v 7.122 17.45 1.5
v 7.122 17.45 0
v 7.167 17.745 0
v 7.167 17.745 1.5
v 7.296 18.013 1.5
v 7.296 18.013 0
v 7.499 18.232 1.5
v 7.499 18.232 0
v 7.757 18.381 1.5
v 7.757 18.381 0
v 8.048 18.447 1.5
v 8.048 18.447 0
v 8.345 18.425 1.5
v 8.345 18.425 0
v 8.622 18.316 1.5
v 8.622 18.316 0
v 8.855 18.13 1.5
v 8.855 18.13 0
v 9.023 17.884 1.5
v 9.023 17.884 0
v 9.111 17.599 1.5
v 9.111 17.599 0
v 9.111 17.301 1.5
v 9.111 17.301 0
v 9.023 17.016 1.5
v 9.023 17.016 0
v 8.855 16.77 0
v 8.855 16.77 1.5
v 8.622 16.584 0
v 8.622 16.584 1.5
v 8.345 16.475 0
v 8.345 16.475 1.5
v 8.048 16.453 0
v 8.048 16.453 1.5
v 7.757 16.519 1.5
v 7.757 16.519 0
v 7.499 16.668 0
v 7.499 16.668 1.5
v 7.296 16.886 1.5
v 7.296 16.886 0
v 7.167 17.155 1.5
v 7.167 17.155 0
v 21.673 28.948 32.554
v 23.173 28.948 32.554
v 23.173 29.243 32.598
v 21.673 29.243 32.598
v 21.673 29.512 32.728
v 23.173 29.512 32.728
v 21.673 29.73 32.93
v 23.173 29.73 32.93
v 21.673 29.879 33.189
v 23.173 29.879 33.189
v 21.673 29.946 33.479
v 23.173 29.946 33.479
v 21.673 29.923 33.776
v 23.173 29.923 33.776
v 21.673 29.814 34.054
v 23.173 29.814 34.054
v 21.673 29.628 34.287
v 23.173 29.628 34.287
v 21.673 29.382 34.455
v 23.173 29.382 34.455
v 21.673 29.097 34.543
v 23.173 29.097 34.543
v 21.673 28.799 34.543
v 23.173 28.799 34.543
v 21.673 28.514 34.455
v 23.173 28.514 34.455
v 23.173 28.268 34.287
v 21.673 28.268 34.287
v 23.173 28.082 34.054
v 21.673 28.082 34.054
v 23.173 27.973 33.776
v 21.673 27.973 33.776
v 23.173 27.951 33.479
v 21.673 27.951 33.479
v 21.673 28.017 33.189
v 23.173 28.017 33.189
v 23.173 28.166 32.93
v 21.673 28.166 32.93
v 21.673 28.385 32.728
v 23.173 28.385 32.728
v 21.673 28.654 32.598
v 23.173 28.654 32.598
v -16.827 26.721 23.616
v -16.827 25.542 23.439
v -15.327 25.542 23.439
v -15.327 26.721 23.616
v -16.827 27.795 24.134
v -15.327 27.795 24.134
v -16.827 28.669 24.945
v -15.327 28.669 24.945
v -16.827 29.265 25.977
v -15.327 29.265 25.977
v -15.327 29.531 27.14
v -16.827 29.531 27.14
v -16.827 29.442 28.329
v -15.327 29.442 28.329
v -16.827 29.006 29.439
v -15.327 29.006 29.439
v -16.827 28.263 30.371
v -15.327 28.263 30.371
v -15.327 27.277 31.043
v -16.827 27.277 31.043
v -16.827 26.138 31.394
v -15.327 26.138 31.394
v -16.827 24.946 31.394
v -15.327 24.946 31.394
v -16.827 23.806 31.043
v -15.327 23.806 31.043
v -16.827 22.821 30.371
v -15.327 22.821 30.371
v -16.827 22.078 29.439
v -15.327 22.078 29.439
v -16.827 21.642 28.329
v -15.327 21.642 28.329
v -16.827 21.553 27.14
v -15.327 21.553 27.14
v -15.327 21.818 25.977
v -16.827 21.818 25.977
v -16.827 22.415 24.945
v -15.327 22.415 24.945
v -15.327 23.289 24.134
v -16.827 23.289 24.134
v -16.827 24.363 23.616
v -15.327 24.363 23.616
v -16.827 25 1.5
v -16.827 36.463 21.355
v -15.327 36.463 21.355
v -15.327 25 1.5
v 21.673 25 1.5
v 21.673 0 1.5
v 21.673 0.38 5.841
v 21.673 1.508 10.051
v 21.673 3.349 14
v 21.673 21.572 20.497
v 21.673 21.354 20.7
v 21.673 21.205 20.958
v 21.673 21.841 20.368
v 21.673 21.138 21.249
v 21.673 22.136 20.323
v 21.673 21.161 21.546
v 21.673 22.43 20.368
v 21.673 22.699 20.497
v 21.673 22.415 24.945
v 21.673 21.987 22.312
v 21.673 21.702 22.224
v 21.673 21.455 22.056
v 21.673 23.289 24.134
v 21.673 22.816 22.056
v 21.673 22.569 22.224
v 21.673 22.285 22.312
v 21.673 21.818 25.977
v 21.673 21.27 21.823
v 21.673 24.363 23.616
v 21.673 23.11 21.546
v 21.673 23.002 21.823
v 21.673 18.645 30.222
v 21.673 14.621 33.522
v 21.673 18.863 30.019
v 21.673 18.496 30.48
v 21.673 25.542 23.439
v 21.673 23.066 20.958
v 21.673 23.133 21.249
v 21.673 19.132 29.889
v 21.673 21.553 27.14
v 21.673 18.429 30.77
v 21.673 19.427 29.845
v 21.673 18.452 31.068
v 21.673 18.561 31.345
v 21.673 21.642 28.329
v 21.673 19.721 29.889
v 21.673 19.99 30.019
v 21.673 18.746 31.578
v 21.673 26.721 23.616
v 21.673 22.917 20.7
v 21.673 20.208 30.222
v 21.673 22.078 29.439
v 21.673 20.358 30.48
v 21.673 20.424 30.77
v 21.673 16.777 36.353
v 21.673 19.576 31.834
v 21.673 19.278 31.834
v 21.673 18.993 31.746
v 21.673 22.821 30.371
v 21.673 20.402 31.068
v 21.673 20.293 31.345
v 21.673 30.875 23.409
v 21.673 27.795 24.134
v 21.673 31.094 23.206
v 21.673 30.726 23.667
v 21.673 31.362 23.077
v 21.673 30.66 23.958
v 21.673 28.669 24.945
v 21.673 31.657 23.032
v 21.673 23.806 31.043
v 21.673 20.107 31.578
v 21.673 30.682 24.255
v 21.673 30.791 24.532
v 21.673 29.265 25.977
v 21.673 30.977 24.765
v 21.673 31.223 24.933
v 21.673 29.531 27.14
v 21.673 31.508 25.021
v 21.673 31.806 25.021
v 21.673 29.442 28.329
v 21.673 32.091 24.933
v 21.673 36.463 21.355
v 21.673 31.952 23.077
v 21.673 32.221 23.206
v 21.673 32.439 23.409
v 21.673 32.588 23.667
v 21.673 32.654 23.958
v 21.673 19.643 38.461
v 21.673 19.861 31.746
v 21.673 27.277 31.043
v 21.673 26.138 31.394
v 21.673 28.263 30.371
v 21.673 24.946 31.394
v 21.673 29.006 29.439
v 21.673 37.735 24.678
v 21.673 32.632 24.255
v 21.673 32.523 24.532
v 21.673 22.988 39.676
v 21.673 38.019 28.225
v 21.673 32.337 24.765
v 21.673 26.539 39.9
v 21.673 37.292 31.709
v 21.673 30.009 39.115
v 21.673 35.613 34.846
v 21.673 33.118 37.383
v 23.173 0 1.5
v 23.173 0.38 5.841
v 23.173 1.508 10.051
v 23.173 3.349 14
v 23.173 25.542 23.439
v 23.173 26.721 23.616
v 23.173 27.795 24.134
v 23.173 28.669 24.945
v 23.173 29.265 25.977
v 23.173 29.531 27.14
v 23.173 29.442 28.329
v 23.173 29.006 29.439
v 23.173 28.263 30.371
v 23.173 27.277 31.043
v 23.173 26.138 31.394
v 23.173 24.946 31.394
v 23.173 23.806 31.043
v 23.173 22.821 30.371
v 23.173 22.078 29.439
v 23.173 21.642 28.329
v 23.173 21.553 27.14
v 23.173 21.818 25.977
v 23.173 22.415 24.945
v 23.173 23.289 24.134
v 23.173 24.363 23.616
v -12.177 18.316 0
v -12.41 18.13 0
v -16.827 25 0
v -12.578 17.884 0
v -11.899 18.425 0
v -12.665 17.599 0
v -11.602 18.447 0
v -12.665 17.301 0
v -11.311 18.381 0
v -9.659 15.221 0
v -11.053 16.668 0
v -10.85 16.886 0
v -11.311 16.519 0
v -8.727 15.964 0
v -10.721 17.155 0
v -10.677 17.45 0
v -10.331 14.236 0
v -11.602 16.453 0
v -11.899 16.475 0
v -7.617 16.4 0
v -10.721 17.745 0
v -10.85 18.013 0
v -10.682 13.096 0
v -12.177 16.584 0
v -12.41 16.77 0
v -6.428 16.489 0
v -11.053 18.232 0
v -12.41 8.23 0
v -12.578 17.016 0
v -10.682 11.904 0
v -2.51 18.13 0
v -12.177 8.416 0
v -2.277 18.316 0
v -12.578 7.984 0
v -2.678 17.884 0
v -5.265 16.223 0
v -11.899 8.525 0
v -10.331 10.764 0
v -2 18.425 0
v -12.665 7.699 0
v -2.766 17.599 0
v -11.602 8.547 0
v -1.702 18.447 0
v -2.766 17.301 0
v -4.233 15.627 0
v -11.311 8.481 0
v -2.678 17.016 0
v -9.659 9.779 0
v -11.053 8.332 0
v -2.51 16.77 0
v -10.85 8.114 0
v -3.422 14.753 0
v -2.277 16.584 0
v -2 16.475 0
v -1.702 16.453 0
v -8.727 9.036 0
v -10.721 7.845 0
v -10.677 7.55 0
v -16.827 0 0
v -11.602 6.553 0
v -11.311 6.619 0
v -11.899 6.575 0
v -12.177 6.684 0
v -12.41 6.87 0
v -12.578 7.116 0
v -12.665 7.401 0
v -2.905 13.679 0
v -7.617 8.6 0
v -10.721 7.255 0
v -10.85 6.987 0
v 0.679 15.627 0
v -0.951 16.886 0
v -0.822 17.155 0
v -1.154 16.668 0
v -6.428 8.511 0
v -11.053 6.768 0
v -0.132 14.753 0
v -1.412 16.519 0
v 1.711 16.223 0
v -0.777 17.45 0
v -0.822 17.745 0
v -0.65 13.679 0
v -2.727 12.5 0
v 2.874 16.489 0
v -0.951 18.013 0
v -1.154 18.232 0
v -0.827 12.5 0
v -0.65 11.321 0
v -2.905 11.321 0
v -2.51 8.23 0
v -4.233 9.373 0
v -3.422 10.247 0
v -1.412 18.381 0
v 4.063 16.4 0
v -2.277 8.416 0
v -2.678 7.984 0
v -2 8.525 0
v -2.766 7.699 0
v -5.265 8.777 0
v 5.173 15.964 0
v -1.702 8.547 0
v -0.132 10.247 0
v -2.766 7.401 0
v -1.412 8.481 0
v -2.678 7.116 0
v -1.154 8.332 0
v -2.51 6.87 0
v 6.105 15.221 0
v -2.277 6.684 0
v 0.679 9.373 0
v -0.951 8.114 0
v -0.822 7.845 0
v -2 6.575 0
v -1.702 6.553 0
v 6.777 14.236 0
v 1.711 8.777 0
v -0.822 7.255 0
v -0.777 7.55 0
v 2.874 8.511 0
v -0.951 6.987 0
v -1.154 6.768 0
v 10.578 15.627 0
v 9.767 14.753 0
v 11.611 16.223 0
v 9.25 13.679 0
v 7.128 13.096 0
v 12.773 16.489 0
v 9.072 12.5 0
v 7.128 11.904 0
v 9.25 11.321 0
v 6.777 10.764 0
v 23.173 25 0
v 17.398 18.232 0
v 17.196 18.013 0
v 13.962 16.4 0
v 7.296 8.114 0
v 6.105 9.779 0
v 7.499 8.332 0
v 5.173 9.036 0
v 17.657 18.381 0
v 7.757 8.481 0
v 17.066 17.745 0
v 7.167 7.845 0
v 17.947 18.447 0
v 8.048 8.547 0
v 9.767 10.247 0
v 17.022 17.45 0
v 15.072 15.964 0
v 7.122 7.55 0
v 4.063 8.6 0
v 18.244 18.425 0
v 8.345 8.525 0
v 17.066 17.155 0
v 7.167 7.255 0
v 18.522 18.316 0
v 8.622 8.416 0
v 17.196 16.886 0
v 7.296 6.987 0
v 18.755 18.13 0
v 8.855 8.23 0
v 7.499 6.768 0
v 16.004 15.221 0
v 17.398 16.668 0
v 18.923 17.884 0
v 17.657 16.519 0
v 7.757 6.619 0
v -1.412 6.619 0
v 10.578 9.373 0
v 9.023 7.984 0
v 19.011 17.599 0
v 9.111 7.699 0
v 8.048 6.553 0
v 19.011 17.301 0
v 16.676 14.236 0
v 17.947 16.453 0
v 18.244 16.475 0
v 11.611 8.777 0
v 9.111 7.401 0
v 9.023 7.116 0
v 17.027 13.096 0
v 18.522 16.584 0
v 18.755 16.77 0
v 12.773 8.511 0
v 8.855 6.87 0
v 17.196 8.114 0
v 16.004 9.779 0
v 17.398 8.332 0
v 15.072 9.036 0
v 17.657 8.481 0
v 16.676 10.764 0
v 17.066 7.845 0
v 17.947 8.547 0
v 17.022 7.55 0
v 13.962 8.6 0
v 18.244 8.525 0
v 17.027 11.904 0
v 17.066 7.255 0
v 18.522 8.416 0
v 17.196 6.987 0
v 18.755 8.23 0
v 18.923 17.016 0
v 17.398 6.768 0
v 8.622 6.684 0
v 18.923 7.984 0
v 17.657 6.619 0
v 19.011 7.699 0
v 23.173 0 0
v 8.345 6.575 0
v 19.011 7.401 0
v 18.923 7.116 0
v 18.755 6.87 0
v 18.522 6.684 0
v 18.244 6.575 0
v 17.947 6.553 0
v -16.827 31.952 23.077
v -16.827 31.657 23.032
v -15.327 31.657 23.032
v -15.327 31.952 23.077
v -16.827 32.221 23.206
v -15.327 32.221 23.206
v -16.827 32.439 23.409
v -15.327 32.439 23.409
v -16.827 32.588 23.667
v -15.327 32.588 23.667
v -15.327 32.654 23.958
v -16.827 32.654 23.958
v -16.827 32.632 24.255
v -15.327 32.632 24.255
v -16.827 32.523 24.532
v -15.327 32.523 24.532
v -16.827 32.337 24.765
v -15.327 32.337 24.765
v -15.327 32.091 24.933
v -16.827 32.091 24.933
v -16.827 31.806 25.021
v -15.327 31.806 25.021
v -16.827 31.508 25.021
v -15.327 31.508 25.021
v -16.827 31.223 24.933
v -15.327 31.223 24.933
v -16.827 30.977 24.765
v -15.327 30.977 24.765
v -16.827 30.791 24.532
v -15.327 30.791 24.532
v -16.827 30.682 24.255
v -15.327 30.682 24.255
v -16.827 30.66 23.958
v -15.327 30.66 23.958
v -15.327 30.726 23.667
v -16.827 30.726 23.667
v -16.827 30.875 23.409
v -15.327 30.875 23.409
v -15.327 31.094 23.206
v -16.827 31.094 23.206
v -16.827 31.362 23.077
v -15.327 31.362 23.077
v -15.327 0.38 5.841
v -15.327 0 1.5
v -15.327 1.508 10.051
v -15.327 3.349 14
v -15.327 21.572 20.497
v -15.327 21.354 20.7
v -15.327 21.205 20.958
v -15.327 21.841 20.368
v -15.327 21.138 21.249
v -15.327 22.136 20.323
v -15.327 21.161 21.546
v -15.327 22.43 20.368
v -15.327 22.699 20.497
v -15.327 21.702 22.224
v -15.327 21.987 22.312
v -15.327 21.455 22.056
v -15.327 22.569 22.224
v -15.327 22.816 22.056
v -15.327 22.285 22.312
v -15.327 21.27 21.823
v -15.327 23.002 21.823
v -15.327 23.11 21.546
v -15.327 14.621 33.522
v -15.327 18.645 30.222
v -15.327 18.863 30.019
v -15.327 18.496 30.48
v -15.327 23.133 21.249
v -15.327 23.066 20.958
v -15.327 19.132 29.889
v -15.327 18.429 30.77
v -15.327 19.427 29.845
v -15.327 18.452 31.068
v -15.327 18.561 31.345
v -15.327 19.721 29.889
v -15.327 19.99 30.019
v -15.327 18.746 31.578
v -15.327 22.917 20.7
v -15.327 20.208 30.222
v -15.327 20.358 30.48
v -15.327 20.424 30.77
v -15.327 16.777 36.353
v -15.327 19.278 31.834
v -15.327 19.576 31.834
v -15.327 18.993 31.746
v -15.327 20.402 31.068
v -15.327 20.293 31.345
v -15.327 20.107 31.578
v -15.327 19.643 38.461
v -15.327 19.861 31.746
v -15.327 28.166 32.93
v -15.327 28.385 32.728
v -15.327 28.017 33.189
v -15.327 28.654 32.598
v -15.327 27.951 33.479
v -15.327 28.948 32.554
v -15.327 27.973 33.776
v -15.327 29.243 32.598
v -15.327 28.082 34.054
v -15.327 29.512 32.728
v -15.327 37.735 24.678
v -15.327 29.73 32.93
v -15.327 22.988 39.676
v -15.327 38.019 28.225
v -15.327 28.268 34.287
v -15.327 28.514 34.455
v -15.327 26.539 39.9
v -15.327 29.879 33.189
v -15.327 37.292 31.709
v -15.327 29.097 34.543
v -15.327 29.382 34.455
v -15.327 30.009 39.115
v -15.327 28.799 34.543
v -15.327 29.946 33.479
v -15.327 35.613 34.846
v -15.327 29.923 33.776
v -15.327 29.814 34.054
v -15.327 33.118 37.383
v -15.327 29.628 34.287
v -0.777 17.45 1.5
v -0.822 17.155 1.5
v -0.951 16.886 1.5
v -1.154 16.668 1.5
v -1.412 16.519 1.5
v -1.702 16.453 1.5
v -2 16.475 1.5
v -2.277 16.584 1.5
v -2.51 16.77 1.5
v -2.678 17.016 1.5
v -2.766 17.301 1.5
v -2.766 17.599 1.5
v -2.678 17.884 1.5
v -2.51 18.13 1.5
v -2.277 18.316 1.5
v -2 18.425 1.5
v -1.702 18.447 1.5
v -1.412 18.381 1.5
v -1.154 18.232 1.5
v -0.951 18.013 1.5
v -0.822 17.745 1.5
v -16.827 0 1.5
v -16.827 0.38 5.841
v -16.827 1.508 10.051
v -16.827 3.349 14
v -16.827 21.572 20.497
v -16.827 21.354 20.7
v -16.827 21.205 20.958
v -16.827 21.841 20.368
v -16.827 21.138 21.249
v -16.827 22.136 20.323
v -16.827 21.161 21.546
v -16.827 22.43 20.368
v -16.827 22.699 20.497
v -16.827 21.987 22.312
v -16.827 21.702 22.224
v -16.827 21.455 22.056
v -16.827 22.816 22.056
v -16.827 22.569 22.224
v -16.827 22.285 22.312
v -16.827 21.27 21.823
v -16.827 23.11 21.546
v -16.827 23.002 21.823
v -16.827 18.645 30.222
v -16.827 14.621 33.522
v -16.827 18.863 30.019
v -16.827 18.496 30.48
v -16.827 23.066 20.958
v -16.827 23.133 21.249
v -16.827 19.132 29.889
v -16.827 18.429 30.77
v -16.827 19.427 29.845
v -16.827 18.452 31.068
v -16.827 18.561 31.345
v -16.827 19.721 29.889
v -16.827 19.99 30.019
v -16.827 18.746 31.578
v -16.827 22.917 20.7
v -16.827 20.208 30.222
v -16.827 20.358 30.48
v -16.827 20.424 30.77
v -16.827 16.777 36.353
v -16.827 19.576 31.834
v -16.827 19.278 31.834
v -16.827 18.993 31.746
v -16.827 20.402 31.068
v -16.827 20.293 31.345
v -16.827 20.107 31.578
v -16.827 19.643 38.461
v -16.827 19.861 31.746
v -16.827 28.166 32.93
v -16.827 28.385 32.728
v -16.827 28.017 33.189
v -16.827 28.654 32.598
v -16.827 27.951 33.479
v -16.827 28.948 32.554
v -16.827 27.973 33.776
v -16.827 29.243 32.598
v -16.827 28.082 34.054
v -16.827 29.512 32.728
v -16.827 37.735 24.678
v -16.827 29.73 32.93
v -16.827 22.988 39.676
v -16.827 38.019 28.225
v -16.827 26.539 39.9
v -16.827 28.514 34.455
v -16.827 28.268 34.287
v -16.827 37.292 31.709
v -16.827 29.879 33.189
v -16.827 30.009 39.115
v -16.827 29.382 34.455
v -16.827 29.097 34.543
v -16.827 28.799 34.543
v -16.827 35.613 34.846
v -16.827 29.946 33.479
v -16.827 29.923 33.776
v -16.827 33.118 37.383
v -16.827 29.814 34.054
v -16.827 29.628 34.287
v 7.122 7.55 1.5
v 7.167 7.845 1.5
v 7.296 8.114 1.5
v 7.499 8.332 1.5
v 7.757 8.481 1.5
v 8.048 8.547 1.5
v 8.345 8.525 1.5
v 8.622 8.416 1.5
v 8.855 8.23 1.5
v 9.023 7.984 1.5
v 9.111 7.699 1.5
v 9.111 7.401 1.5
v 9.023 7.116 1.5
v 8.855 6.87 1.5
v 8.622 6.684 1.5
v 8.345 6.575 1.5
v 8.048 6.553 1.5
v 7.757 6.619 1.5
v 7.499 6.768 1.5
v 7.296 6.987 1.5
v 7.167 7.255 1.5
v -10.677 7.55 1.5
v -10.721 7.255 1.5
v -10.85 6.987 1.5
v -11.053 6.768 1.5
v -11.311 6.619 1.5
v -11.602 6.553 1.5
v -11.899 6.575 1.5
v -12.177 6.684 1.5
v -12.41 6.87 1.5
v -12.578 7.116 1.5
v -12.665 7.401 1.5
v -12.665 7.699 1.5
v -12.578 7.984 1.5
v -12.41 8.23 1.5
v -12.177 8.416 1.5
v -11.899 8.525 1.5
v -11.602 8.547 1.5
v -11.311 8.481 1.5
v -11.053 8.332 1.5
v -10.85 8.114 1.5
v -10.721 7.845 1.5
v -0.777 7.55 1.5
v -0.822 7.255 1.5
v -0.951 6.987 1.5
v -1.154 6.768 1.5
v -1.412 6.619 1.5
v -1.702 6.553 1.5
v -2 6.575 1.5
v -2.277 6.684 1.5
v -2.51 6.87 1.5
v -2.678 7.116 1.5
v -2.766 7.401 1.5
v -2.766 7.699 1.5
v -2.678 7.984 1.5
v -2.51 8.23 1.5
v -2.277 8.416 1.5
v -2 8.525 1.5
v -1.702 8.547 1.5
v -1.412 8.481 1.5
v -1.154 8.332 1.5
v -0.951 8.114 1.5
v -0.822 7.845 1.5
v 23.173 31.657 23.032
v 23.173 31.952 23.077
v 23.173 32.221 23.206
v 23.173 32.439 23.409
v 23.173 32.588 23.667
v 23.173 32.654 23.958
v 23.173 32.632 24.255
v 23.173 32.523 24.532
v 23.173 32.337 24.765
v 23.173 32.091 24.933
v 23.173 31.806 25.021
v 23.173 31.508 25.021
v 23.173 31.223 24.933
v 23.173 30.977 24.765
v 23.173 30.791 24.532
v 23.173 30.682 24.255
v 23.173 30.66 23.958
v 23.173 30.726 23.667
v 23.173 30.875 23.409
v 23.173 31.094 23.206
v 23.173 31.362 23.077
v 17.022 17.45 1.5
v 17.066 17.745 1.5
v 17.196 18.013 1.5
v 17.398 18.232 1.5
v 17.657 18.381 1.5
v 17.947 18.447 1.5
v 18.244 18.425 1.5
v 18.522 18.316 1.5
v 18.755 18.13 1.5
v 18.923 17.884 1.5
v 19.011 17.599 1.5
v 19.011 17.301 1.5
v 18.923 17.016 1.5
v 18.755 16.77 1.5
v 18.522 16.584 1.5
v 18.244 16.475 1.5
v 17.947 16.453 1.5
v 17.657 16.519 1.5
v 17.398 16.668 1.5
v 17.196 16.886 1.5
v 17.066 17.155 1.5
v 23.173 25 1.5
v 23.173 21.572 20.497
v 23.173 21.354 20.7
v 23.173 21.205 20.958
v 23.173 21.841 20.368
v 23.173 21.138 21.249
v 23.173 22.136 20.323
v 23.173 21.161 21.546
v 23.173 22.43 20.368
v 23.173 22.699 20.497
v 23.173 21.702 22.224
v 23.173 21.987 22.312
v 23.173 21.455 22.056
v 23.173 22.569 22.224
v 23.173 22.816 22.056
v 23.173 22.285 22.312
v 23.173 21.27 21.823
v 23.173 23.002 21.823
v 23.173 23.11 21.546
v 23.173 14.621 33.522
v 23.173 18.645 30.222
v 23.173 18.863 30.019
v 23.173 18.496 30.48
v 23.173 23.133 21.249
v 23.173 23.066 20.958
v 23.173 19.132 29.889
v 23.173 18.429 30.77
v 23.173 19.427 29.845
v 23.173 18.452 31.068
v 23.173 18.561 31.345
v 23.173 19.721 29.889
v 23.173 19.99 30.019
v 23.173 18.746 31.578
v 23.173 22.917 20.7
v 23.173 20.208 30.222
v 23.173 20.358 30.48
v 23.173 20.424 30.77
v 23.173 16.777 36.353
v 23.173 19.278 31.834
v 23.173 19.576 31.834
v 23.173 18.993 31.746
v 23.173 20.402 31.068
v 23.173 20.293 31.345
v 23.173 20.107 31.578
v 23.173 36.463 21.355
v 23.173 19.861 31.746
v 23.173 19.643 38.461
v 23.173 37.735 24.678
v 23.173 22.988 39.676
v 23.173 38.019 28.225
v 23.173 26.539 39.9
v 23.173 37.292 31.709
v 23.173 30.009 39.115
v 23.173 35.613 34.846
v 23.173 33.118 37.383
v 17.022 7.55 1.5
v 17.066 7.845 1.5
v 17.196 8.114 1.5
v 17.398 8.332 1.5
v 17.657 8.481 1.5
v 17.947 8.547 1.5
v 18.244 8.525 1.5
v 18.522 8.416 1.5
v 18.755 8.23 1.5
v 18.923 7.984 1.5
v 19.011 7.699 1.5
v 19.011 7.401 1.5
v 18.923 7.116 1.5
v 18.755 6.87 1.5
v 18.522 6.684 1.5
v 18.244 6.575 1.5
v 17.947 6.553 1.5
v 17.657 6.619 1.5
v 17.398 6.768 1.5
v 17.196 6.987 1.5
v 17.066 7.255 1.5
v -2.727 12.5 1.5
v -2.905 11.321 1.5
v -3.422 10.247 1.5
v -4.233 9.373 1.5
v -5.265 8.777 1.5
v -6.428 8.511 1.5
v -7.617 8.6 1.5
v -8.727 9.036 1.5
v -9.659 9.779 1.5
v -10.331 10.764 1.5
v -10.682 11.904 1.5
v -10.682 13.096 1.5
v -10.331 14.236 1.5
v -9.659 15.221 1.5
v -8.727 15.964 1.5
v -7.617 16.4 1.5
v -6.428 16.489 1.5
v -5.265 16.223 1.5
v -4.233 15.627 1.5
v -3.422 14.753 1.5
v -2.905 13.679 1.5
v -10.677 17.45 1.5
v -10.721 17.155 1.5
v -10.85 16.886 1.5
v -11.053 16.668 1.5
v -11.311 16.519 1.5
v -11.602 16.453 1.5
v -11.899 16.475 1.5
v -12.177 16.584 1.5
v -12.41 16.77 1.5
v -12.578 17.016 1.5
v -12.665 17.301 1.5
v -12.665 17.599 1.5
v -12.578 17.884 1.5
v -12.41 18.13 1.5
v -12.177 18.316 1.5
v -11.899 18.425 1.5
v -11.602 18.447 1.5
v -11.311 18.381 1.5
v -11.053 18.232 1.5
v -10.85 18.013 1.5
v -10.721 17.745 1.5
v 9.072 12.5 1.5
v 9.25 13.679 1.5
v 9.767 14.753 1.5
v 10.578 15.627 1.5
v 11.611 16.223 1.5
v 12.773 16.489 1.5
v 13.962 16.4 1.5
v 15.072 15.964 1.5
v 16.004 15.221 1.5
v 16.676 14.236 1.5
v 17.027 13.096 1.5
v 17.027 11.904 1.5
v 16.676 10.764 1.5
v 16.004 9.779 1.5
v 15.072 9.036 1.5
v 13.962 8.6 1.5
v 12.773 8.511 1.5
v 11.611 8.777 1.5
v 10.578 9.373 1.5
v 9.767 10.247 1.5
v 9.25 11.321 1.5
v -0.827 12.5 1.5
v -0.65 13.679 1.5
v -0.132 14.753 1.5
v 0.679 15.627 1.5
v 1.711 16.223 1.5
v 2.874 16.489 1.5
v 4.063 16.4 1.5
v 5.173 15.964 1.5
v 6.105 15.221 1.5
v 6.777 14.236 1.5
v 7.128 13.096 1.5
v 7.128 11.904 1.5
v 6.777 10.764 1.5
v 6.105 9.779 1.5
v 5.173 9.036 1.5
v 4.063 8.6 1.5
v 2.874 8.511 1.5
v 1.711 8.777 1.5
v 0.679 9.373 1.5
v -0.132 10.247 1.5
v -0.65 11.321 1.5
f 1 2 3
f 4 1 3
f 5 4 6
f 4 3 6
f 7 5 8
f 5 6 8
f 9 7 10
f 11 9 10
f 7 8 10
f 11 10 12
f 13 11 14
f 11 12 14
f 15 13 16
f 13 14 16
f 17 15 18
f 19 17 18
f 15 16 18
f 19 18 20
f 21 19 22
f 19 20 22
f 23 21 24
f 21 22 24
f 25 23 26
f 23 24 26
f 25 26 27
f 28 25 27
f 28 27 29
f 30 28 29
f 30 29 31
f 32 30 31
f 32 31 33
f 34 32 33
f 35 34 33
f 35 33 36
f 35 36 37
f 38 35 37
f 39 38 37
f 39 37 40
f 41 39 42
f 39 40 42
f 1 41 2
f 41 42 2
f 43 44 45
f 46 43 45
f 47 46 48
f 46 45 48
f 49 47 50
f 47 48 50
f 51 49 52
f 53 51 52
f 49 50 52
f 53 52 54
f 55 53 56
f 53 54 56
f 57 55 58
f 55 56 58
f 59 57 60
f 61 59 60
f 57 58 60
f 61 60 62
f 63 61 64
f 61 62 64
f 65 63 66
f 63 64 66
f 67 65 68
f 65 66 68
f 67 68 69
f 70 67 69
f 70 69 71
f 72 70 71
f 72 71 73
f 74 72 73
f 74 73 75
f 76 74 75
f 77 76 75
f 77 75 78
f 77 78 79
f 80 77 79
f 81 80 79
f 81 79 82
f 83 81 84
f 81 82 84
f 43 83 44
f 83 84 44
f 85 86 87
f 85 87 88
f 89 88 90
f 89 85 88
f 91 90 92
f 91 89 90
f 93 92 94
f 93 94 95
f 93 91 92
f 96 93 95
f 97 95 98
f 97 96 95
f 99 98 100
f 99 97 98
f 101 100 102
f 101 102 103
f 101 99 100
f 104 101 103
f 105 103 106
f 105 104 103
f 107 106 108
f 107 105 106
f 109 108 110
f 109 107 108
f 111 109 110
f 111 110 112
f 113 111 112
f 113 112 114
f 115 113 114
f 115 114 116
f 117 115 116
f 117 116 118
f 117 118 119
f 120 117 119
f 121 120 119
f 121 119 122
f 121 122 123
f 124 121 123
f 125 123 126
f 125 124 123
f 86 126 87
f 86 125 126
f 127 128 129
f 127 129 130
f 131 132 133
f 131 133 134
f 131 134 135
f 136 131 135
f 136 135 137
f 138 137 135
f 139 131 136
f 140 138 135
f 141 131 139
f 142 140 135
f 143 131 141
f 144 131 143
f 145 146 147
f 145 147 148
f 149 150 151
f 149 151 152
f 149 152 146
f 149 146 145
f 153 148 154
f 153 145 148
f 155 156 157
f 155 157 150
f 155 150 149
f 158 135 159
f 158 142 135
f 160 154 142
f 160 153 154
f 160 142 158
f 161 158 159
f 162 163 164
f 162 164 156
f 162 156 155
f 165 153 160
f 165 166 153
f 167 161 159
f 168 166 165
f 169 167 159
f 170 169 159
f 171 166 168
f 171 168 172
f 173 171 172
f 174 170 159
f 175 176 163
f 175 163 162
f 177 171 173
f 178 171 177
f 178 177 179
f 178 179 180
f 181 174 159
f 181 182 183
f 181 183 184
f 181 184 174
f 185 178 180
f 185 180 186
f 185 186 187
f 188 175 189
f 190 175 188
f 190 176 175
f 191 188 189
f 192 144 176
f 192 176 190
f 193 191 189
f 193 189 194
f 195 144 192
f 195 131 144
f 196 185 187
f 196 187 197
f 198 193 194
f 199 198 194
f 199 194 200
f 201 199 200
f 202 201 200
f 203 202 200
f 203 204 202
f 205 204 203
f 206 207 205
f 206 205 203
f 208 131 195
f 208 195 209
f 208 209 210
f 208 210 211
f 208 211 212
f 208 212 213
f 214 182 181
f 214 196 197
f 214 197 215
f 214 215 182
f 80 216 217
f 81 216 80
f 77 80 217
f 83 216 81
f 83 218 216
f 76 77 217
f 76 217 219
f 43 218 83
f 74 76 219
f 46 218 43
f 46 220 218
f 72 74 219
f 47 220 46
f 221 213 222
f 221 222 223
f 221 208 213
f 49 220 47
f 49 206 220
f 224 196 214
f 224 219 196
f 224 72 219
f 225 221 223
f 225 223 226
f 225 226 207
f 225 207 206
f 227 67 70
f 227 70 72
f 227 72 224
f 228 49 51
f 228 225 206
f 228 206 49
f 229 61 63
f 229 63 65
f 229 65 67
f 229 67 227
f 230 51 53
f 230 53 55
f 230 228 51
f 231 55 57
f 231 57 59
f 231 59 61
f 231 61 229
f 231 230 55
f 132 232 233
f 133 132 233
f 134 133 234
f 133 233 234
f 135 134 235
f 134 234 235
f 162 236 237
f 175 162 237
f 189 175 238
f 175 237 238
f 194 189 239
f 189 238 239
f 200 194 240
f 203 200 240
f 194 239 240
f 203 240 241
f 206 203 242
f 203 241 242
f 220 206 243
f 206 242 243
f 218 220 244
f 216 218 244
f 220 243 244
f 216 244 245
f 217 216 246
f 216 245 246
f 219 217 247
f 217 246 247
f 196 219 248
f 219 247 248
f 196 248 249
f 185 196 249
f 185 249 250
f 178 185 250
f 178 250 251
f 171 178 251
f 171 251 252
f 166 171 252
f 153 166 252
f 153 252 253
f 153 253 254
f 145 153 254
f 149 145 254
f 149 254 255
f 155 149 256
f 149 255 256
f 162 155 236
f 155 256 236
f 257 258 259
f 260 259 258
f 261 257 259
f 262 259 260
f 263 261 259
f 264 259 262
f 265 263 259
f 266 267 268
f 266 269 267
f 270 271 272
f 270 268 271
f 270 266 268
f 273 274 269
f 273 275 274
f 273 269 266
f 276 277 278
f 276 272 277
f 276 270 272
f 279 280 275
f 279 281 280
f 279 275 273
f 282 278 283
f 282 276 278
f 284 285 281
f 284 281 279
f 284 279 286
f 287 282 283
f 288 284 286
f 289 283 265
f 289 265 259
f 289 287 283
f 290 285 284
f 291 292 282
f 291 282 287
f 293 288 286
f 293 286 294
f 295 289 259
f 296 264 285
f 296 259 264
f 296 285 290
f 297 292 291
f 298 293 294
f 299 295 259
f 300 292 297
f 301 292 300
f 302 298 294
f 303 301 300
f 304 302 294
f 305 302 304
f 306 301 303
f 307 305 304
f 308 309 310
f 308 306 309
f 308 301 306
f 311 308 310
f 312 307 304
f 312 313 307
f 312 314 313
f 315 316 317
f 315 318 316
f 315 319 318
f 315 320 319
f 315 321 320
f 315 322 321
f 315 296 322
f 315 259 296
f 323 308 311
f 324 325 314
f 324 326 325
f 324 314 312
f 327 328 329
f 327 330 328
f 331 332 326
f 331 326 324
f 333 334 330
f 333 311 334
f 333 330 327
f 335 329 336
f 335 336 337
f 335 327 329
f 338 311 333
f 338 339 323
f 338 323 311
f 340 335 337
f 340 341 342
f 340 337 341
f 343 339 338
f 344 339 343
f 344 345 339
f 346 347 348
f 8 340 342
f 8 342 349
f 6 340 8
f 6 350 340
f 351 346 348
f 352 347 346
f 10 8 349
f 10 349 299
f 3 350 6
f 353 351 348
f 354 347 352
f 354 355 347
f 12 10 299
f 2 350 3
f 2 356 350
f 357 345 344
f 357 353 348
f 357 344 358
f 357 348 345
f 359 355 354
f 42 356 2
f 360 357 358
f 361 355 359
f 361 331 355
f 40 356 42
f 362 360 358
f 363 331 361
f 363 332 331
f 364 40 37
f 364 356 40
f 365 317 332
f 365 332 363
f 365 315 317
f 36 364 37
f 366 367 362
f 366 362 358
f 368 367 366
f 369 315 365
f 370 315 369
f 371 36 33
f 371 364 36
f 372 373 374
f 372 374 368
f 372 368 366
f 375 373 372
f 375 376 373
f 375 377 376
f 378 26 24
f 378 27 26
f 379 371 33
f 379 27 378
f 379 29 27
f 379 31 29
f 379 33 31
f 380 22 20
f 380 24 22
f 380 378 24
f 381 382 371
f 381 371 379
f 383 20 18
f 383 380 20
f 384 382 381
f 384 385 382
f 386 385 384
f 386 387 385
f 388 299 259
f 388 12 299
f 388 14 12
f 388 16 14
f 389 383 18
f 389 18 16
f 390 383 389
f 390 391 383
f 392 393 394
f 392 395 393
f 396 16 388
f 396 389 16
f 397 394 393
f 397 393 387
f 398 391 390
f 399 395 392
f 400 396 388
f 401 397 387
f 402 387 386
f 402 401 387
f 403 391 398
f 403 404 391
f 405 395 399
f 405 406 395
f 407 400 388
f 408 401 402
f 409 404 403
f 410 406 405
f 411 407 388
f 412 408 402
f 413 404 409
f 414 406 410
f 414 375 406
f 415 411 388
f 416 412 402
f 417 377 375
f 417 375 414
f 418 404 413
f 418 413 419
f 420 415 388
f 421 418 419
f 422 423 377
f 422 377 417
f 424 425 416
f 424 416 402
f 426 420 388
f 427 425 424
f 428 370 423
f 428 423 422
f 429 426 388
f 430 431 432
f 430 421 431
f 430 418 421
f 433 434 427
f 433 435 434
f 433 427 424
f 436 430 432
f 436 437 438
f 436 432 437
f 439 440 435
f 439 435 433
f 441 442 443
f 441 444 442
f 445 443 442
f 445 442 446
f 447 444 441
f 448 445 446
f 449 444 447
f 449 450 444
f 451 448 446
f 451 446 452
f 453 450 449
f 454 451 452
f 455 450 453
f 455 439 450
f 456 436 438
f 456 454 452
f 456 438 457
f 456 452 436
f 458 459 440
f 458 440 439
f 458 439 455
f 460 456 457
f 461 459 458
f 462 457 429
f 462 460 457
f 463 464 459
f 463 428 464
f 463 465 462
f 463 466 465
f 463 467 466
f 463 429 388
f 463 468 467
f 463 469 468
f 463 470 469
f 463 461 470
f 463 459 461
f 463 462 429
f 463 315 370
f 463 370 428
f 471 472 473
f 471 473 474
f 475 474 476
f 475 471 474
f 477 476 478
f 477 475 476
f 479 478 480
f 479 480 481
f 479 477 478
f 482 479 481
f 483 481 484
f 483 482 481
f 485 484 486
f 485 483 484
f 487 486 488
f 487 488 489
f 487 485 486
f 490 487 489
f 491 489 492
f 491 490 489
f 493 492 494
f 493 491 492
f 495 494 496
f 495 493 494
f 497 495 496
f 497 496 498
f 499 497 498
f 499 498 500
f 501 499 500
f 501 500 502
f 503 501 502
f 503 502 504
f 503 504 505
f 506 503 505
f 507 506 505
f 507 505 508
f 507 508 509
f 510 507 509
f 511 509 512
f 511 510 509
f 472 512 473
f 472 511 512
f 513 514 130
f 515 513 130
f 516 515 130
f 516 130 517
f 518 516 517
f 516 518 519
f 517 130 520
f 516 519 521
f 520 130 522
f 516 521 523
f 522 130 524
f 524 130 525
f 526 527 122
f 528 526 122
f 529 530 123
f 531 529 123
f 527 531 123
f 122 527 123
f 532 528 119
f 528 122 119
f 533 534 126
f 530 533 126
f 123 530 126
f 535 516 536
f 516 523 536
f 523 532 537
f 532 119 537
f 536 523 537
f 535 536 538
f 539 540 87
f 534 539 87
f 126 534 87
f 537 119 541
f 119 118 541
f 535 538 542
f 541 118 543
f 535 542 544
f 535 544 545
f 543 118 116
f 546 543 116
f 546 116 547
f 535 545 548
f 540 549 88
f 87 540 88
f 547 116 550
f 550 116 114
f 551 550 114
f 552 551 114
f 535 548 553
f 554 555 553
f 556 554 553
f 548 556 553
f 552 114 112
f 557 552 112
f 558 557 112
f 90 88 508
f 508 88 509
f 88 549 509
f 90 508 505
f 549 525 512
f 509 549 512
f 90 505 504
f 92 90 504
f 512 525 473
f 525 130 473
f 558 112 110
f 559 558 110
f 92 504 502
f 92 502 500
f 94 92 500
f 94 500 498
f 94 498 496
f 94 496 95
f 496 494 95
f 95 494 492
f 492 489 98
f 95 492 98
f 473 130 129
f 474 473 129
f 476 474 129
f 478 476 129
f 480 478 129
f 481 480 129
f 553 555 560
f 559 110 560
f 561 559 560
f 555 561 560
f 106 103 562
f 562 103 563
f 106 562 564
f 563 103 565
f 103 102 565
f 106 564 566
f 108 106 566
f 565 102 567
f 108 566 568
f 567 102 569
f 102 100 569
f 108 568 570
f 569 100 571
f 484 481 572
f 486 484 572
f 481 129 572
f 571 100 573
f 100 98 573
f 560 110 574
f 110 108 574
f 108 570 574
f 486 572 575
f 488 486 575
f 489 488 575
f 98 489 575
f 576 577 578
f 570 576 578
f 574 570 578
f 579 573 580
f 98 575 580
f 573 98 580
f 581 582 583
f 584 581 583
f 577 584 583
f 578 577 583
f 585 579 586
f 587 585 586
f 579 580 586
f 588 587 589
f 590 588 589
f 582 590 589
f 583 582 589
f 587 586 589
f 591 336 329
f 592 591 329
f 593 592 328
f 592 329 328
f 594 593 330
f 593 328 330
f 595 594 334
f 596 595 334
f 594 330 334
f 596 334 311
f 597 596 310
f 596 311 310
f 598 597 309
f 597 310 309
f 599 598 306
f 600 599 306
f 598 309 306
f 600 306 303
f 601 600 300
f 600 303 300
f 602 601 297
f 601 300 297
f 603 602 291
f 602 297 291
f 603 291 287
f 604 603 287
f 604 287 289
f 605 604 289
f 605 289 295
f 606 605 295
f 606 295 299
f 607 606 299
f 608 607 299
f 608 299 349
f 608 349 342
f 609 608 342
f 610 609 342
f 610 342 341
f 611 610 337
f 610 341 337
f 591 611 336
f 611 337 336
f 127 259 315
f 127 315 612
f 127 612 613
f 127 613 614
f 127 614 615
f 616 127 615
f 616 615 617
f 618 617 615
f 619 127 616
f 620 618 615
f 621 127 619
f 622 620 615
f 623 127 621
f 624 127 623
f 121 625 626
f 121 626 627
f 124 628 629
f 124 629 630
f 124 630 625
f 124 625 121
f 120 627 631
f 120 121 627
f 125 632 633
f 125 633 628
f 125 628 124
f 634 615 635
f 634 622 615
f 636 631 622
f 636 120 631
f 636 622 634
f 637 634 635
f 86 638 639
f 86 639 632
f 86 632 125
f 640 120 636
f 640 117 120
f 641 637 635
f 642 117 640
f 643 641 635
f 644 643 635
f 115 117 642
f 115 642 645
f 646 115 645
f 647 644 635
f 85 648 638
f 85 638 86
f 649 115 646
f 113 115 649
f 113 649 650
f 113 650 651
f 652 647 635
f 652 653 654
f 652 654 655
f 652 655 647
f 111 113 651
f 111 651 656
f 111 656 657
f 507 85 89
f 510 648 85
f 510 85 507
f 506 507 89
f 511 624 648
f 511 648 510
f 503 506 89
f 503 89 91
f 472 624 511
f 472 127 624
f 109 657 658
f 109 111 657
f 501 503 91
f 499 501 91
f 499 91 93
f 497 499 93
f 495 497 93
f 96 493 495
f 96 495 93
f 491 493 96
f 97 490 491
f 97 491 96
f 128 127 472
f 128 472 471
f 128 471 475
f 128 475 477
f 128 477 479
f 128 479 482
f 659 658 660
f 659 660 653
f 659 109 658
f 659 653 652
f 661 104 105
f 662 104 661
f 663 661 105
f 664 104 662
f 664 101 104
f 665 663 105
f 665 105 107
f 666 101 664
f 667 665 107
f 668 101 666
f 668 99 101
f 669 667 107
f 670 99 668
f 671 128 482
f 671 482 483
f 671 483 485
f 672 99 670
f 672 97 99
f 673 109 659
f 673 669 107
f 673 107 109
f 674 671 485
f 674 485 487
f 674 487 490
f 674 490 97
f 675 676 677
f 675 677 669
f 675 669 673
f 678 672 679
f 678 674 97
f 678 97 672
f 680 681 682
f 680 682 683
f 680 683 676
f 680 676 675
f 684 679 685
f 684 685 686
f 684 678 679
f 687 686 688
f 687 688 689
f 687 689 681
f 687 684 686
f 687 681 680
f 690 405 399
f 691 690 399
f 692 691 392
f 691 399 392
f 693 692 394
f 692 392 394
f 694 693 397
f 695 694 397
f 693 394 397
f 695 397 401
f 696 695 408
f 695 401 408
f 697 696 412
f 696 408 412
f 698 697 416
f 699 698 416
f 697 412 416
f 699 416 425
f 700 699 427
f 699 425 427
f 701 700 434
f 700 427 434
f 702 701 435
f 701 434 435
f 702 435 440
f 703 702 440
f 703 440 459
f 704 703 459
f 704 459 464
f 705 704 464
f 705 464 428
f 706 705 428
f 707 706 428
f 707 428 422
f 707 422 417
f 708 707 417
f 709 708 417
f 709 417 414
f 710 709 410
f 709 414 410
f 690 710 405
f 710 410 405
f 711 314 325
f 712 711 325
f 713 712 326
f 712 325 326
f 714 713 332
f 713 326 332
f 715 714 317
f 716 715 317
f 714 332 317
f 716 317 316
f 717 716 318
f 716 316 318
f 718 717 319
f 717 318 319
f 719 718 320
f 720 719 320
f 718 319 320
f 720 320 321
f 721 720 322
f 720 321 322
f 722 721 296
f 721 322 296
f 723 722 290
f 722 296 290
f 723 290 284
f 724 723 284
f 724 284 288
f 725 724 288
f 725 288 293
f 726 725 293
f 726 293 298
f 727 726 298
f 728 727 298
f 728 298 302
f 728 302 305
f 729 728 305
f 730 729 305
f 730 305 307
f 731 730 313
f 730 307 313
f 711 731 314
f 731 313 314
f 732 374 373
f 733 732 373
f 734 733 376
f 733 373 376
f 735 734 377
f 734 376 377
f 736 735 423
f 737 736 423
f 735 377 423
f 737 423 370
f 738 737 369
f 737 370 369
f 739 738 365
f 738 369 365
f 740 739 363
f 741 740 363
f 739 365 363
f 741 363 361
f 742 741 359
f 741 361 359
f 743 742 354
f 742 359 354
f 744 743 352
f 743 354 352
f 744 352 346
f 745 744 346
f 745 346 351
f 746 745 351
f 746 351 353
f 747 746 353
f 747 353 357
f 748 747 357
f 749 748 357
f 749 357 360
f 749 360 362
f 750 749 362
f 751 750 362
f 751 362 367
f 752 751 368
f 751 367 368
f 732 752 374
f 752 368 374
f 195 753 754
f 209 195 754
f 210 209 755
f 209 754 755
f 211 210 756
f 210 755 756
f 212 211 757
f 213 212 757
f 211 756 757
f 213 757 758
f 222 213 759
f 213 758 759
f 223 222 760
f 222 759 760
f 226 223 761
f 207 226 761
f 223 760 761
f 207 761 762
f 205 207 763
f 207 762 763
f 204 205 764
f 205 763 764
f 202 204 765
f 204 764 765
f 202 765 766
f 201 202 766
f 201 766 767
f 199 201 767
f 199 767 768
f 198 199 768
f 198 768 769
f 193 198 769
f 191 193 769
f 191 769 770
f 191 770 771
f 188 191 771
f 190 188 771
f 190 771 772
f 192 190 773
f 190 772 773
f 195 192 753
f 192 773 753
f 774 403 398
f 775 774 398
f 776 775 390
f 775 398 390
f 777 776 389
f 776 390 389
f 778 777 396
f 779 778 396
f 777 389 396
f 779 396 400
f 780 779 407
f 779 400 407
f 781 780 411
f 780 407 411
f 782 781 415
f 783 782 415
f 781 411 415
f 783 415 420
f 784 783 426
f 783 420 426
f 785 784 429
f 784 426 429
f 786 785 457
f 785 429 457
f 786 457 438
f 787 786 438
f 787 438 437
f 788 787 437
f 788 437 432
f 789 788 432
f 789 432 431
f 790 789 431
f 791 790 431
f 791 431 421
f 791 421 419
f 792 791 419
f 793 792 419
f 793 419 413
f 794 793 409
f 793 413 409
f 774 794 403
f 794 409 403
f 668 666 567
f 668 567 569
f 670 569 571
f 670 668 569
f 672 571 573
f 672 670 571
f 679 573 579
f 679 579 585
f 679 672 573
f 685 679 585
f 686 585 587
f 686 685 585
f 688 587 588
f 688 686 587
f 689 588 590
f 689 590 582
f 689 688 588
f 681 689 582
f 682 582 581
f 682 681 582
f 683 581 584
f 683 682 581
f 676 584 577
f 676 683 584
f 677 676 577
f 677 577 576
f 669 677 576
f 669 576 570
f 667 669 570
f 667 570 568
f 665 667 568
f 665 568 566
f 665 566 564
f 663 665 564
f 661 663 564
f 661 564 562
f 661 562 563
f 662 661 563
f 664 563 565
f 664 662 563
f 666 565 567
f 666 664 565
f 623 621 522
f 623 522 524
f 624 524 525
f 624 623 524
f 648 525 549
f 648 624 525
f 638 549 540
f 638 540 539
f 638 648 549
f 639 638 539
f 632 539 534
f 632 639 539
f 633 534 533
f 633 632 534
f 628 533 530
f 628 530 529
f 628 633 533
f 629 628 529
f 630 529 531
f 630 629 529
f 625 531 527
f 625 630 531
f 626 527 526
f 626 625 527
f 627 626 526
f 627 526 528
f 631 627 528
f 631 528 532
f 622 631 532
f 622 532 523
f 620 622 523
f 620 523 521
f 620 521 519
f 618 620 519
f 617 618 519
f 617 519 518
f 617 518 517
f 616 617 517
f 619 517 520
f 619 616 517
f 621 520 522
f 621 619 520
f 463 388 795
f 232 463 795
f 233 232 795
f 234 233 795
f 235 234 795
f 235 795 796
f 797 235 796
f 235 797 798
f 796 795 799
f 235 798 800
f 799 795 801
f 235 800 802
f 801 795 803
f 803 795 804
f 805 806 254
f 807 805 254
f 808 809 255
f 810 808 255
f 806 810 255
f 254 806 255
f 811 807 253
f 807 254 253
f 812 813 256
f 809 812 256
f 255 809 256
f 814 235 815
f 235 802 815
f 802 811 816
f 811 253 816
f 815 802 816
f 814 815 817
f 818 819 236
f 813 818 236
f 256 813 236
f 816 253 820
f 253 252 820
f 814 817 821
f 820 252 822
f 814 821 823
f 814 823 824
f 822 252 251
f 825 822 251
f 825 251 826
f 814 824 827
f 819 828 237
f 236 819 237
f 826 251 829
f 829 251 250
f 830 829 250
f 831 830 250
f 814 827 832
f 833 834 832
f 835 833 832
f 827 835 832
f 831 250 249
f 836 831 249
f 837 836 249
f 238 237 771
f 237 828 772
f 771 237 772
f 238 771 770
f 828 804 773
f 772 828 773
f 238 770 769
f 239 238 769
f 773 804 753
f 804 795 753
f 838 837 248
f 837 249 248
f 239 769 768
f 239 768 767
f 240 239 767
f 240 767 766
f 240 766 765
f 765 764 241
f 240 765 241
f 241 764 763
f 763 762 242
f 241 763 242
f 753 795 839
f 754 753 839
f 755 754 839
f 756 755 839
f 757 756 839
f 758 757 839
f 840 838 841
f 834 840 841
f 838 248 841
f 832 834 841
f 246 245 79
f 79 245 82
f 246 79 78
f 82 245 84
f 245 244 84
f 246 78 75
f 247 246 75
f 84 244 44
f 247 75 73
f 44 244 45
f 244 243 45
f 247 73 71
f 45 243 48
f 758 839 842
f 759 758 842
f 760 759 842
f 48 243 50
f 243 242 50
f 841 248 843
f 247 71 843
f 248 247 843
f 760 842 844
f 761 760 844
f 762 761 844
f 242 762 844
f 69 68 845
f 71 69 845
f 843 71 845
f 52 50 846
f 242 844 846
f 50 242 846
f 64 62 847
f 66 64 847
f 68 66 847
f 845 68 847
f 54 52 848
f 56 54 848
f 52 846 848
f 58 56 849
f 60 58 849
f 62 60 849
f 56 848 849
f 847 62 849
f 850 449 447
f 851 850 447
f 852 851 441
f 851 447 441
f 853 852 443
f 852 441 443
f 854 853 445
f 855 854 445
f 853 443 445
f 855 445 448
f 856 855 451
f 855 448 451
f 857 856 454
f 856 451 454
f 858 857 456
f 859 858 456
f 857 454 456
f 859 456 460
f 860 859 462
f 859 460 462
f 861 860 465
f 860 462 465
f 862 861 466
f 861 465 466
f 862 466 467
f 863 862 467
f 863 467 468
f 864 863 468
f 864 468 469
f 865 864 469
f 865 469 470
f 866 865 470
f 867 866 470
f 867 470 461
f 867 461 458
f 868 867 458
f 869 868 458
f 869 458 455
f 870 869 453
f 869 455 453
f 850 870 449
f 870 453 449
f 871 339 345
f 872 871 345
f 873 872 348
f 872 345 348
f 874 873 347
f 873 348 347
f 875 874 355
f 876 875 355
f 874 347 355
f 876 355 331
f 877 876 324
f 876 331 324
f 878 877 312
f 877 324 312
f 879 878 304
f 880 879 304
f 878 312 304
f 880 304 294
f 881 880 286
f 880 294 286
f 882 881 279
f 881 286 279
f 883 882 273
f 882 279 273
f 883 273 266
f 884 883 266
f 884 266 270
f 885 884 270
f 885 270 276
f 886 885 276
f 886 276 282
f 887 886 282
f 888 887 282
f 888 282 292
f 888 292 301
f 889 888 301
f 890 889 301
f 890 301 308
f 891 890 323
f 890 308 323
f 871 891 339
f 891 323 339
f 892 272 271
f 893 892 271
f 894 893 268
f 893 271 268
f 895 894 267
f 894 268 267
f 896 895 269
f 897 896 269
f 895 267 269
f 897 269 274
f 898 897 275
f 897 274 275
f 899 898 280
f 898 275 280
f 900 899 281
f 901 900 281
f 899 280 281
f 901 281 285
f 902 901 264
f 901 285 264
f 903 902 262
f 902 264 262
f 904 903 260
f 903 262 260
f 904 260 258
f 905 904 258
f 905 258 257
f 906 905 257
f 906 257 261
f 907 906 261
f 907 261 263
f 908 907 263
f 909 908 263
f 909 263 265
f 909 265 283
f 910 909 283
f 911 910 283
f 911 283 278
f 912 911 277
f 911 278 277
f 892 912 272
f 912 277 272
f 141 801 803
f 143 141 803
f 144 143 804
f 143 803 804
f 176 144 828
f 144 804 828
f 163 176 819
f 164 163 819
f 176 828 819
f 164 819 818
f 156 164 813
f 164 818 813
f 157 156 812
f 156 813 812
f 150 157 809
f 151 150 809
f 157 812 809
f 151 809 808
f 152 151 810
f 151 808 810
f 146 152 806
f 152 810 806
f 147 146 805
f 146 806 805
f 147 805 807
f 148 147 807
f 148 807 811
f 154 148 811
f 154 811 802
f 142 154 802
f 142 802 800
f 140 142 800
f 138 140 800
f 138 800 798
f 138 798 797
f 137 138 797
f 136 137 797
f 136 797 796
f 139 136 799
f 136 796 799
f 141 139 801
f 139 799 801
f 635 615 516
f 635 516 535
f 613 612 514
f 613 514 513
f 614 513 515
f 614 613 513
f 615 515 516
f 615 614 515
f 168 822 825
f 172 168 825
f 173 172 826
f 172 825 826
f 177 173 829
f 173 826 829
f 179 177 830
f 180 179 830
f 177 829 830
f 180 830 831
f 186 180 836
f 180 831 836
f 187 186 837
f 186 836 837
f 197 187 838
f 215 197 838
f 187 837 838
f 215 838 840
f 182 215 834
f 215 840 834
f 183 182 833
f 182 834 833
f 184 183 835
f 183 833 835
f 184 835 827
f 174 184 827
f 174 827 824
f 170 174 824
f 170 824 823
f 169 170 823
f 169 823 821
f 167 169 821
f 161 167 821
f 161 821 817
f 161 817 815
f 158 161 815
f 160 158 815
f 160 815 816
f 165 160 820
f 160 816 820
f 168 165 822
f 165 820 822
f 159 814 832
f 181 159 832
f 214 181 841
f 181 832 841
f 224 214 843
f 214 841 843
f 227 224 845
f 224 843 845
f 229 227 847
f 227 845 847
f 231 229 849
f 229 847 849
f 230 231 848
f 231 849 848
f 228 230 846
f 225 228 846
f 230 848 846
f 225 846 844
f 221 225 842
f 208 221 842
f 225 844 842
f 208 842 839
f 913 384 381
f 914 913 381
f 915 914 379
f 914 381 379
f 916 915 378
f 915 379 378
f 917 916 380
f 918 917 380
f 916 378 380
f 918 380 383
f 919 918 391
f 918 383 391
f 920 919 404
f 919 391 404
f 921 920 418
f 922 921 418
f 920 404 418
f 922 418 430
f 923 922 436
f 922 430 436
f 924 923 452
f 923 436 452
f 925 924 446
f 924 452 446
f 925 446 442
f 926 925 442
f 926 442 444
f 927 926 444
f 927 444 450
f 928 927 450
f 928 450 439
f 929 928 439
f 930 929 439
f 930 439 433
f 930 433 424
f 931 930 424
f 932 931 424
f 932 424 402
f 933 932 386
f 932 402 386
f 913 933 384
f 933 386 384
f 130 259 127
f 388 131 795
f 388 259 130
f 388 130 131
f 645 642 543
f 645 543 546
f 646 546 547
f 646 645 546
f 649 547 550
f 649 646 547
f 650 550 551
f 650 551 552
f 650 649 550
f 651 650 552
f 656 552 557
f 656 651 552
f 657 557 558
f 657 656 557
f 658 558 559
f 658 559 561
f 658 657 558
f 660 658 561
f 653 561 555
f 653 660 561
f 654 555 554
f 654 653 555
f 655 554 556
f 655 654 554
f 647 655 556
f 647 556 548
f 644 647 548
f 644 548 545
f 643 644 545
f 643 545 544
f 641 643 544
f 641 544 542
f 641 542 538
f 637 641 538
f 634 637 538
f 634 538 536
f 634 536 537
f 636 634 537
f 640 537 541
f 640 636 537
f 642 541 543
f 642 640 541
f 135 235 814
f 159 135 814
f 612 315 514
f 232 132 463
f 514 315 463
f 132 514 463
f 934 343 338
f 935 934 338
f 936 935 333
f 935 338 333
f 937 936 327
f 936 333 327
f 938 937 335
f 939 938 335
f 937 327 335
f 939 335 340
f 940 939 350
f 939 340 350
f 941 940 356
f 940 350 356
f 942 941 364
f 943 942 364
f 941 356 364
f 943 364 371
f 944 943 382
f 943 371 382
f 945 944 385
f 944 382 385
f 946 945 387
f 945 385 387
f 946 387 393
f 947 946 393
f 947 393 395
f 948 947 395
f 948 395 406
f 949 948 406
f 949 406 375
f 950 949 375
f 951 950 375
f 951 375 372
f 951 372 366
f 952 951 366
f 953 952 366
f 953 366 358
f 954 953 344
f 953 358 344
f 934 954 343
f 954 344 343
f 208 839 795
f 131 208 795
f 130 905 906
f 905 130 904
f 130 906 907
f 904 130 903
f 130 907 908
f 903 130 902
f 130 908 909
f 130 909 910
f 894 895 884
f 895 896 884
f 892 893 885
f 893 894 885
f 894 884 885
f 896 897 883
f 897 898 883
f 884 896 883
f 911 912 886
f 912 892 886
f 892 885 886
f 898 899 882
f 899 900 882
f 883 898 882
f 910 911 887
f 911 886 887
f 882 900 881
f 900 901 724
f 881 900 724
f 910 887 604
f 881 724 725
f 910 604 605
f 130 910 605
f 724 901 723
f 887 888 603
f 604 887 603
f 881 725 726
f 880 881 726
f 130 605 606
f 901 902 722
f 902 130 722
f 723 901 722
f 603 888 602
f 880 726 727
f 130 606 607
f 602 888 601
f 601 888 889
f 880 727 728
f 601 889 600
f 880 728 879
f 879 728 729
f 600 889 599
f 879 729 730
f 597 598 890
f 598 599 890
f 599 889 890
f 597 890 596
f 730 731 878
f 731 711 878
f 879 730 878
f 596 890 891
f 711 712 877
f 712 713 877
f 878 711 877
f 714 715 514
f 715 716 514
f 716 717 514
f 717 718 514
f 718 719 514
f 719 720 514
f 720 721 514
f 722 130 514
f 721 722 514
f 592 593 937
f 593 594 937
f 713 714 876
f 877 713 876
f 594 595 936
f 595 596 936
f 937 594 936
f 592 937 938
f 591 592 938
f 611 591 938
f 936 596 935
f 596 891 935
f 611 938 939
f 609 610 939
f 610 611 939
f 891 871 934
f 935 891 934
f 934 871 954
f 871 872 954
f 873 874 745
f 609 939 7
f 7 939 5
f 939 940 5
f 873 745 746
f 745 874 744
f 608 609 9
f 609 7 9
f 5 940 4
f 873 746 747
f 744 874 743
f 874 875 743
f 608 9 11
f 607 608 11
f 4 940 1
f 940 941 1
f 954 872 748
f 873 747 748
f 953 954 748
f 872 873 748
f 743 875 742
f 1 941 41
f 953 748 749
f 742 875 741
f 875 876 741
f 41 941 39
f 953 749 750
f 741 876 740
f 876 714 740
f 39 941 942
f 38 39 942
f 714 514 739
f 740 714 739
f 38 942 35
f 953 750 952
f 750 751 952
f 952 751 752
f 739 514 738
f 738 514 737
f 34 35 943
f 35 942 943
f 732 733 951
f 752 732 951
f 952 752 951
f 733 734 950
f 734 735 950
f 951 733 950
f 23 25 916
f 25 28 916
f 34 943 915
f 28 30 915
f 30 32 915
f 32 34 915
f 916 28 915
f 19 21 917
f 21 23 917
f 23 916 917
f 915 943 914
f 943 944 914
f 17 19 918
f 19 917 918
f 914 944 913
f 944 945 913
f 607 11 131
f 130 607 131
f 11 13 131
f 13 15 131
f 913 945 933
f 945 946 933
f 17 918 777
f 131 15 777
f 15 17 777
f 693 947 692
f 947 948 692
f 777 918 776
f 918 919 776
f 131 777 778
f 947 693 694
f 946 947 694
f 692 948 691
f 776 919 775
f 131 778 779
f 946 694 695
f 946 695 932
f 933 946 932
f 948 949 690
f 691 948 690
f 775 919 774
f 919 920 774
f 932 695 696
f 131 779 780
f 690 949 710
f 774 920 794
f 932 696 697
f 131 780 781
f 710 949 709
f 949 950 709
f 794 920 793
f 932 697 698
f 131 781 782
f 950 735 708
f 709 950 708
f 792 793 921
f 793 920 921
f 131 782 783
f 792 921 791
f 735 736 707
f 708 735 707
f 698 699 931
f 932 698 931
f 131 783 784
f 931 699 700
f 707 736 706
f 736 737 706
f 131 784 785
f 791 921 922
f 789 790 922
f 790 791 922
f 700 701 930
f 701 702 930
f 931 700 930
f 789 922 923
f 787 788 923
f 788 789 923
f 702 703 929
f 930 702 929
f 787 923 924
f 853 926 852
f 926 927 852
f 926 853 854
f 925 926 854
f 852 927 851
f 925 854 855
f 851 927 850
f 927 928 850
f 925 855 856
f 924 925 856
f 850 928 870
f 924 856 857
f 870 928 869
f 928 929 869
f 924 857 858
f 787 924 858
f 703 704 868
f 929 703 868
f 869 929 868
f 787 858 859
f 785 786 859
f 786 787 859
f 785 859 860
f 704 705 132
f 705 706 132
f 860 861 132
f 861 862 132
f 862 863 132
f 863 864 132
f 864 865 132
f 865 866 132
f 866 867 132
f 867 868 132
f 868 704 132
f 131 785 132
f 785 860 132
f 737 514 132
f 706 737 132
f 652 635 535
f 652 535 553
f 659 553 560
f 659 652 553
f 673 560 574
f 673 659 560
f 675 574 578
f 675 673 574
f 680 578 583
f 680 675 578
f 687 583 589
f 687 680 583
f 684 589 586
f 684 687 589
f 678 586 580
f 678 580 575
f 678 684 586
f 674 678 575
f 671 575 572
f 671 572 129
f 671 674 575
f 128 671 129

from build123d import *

# Parameters (mm, degrees)
SKETCH3_W           = 40
SKETCH3_H           = 1.5
BOSS_EXTRUDE3_DEPTH = 25
SKETCH4_R           = 4
SKETCH4_R_2         = 1
BOSS_EXTRUDE4_DEPTH = 1.5
SKETCH6_R           = 4
SKETCH6_R_2         = 1
CUT_EXTRUDE1_DEPTH  = 1.5


with BuildPart() as part:
    # Sketch3 → Boss-Extrude3 (new body)
    with BuildSketch(Plane(origin=(0, 0, 0), x_dir=(1, 0, 0), z_dir=(0, 1, 0))):
        with Locations((3.172638191, -0.75)):
            Rectangle(SKETCH3_W, SKETCH3_H)
    extrude(amount=BOSS_EXTRUDE3_DEPTH)

    # Sketch4 → Boss-Extrude4 (add)
    with BuildSketch(Plane(origin=(23.172638191, 0, 0), x_dir=(0, 0, -1), z_dir=(1, 0, 0))):
        with BuildLine():
            Line((-14, 3.349364905), (-33.522182008, 14.620501943))
            ThreePointArc((-33.522182008, 14.620501943), (-38.360080348, 31.625461179), (-21.355121112, 36.463359519))
            Line((-21.355121112, 36.463359519), (-1.5, 25))
            Line((-1.5, 25), (-1.5, 0))
            ThreePointArc((-1.5, 0), (-7.970476128, 0.851854343), (-14, 3.349364905))
        make_face()
        with Locations((-27.43865156, 25.541930731)):
            Circle(SKETCH4_R, mode=Mode.SUBTRACT)
        with Locations((-30.84502587, 19.426653627)):
            Circle(SKETCH4_R_2, mode=Mode.SUBTRACT)
        with Locations((-33.553928663, 28.948305041)):
            Circle(SKETCH4_R_2, mode=Mode.SUBTRACT)
        with Locations((-24.032277249, 31.657207834)):
            Circle(SKETCH4_R_2, mode=Mode.SUBTRACT)
        with Locations((-21.323374456, 22.13555642)):
            Circle(SKETCH4_R_2, mode=Mode.SUBTRACT)
    boss_extrude4 = extrude(amount=-BOSS_EXTRUDE4_DEPTH)

    # Mirror1: Boss-Extrude4 across plane
    add(boss_extrude4.mirror(Plane.ZY.offset(-3.172638191)))

    # Sketch6 → Cut-Extrude1 (cut)
    with BuildSketch(Plane(origin=(0, 0, 0), x_dir=(-1, 0, 0), z_dir=(0, 0, -1))):
        with Locations((-3.172638191, 12.5)):
            Circle(SKETCH6_R)
        with Locations((-13.072133128, 12.5)):
            Circle(SKETCH6_R)
        with Locations((-8.12238566, 7.550252532)):
            Circle(SKETCH6_R_2)
        with Locations((-18.021880596, 7.550252532)):
            Circle(SKETCH6_R_2)
        with Locations((-18.021880596, 17.449747468)):
            Circle(SKETCH6_R_2)
        with Locations((-8.12238566, 17.449747468)):
            Circle(SKETCH6_R_2)
        with Locations(Location((11.676604214, 17.449747468, 0), (0, 0, 180))):
            Circle(SKETCH6_R_2)
        with Locations(Location((1.777109277, 17.449747468, 0), (0, 0, 180))):
            Circle(SKETCH6_R_2)
        with Locations(Location((11.676604214, 7.550252532, 0), (0, 0, 180))):
            Circle(SKETCH6_R_2)
        with Locations(Location((6.726856745, 12.5, 0), (0, 0, 180))):
            Circle(SKETCH6_R)
        with Locations(Location((1.777109277, 7.550252532, 0), (0, 0, 180))):
            Circle(SKETCH6_R_2)
    extrude(amount=-CUT_EXTRUDE1_DEPTH, mode=Mode.SUBTRACT)


solid = part.part
